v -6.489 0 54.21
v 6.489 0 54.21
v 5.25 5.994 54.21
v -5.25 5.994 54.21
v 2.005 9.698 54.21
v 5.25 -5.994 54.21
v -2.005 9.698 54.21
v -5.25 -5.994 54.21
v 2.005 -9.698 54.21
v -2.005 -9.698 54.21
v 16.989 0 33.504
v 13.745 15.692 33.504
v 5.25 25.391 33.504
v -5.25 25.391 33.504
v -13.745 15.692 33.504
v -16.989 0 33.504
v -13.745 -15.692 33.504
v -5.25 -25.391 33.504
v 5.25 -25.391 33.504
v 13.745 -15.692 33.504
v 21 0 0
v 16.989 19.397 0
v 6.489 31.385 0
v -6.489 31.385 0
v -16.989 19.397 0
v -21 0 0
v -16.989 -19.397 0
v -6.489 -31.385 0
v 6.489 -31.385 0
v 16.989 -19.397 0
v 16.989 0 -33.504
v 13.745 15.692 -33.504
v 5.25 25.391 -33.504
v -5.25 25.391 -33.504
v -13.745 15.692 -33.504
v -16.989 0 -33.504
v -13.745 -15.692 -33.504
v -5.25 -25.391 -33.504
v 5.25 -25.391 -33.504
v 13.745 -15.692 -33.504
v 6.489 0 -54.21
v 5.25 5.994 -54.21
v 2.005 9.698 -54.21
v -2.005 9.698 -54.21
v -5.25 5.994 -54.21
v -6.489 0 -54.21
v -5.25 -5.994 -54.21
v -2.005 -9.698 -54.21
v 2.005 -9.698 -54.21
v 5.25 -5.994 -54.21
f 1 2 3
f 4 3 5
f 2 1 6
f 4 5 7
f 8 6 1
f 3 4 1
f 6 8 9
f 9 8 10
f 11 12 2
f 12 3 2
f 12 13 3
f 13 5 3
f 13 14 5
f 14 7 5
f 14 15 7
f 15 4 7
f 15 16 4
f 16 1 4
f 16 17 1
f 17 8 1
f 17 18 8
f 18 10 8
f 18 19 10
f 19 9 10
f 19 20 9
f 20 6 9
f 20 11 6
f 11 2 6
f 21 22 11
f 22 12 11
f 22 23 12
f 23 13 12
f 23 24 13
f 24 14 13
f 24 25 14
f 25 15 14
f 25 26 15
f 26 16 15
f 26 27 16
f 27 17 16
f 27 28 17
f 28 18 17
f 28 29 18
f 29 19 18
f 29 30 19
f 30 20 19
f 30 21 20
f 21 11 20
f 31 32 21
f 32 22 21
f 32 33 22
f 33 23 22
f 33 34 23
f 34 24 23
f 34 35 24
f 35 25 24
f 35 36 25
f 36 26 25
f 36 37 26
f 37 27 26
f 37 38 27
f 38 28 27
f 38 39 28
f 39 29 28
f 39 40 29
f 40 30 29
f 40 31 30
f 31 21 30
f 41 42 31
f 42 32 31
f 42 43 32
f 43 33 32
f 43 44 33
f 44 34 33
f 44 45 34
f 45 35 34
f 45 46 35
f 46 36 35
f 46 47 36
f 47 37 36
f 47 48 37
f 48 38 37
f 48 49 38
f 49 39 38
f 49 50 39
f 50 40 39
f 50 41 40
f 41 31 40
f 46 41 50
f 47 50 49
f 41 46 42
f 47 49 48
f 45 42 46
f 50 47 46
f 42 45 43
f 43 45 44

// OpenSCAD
// Generated by SolidPython 1.0.1 on 2020-07-29 00:46:47


scale(v = [7, 11, 19]) {
	sphere(r = 3);
}
/***********************************************
*********      SolidPython code:      **********
************************************************
 
# import packages: SolidPython
from solid import *
from solid.utils import *
from itertools import chain, combinations, permutations


class Resize:

    def __init__(self, scad_file):
        self.scad_file = scad_file
        #self.scad_file = import_scad(scad_file)
        # cone/cylinder param:
        self.r1 = 0
        self.r2 = 0
        self.h = 0
        # rectangular prism param:
        self.w = 0
        self.l = 0
        # ellipse param:
        self.r = 0

    # import OpenScad code (file name corresponds to shape)


    # classify shape + parameters
    def assign(self, param1, param2, param3):
        if self.scad_file == 'cone.scad':
            self.r1 = param1
            self.r2 = param2
            self.h = param3
        elif self.scad_file == 'cylinder.scad':
            self.r1 = param1
            self.r2 = param2
            self.h = param3
        elif self.scad_file == 'rectangularPrism.scad':
            self.h = param1
            self.l = param2
            self.w = param3
        else:
            self.r = param1
            self.h = param2

    # resize parameters
    def iterate(self):
        x = range(3, 20, 2)
        i = 1
        if self.scad_file == 'cone.scad':
            tempList = list(permutations(x, 2))
            for temp in tempList:
                param1 = temp[0]
                param2 = temp[1]
                filepath = 'produced_scad_files/' + 'cone' + str(param1) + '_' + str(param2) + '_' + '.scad'
                scad_render_to_file(cylinder(h=param1, r1=param2, r2=0), filepath)

        elif self.scad_file == 'cylinder.scad':
            tempList = list(permutations(x, 3))
            for temp in tempList:
                param1 = temp[0]
                param2 = temp[1]
                filepath = 'produced_scad_files/' + 'cylinder' + str(param1) + '_' + str(param2) + '_' + '.scad'
                scad_render_to_file(cylinder(h=param1, r1=param2, r2=param2), filepath)

        elif self.scad_file == 'rectangularPrism.scad':
            tempList = list(permutations(x, 3))
            for temp in tempList:
                param1 = temp[0]
                param2 = temp[1]
                param3 = temp[2]
                filepath = 'produced_scad_files/' + 'rectangularPrism' + str(param1) + '_' + str(param2) + '_' + str(
                    param3) + '.scad'
                scad_render_to_file(cube(size=(param1, param2, param3)), filepath)

        elif self.scad_file == 'ellipse.scad':
            tempList = list(permutations(x, 4))
            for temp in tempList:
                param1 = temp[0]
                param2 = temp[1]
                param3 = temp[2]
                param4 = temp[3]
                filepath = 'produced_scad_files/' + 'ellipse' + str(param1) + '_' + str(param2) + '_' + str(param3) + '_' + str(param4) + '.scad'
                scad_render_to_file(scale([param1, param2, param3])(sphere(r=param4)), filepath)

    def render_to_scadfile(self):
        scad_render_to_file(scad, 'example.scad') 
 
************************************************/
